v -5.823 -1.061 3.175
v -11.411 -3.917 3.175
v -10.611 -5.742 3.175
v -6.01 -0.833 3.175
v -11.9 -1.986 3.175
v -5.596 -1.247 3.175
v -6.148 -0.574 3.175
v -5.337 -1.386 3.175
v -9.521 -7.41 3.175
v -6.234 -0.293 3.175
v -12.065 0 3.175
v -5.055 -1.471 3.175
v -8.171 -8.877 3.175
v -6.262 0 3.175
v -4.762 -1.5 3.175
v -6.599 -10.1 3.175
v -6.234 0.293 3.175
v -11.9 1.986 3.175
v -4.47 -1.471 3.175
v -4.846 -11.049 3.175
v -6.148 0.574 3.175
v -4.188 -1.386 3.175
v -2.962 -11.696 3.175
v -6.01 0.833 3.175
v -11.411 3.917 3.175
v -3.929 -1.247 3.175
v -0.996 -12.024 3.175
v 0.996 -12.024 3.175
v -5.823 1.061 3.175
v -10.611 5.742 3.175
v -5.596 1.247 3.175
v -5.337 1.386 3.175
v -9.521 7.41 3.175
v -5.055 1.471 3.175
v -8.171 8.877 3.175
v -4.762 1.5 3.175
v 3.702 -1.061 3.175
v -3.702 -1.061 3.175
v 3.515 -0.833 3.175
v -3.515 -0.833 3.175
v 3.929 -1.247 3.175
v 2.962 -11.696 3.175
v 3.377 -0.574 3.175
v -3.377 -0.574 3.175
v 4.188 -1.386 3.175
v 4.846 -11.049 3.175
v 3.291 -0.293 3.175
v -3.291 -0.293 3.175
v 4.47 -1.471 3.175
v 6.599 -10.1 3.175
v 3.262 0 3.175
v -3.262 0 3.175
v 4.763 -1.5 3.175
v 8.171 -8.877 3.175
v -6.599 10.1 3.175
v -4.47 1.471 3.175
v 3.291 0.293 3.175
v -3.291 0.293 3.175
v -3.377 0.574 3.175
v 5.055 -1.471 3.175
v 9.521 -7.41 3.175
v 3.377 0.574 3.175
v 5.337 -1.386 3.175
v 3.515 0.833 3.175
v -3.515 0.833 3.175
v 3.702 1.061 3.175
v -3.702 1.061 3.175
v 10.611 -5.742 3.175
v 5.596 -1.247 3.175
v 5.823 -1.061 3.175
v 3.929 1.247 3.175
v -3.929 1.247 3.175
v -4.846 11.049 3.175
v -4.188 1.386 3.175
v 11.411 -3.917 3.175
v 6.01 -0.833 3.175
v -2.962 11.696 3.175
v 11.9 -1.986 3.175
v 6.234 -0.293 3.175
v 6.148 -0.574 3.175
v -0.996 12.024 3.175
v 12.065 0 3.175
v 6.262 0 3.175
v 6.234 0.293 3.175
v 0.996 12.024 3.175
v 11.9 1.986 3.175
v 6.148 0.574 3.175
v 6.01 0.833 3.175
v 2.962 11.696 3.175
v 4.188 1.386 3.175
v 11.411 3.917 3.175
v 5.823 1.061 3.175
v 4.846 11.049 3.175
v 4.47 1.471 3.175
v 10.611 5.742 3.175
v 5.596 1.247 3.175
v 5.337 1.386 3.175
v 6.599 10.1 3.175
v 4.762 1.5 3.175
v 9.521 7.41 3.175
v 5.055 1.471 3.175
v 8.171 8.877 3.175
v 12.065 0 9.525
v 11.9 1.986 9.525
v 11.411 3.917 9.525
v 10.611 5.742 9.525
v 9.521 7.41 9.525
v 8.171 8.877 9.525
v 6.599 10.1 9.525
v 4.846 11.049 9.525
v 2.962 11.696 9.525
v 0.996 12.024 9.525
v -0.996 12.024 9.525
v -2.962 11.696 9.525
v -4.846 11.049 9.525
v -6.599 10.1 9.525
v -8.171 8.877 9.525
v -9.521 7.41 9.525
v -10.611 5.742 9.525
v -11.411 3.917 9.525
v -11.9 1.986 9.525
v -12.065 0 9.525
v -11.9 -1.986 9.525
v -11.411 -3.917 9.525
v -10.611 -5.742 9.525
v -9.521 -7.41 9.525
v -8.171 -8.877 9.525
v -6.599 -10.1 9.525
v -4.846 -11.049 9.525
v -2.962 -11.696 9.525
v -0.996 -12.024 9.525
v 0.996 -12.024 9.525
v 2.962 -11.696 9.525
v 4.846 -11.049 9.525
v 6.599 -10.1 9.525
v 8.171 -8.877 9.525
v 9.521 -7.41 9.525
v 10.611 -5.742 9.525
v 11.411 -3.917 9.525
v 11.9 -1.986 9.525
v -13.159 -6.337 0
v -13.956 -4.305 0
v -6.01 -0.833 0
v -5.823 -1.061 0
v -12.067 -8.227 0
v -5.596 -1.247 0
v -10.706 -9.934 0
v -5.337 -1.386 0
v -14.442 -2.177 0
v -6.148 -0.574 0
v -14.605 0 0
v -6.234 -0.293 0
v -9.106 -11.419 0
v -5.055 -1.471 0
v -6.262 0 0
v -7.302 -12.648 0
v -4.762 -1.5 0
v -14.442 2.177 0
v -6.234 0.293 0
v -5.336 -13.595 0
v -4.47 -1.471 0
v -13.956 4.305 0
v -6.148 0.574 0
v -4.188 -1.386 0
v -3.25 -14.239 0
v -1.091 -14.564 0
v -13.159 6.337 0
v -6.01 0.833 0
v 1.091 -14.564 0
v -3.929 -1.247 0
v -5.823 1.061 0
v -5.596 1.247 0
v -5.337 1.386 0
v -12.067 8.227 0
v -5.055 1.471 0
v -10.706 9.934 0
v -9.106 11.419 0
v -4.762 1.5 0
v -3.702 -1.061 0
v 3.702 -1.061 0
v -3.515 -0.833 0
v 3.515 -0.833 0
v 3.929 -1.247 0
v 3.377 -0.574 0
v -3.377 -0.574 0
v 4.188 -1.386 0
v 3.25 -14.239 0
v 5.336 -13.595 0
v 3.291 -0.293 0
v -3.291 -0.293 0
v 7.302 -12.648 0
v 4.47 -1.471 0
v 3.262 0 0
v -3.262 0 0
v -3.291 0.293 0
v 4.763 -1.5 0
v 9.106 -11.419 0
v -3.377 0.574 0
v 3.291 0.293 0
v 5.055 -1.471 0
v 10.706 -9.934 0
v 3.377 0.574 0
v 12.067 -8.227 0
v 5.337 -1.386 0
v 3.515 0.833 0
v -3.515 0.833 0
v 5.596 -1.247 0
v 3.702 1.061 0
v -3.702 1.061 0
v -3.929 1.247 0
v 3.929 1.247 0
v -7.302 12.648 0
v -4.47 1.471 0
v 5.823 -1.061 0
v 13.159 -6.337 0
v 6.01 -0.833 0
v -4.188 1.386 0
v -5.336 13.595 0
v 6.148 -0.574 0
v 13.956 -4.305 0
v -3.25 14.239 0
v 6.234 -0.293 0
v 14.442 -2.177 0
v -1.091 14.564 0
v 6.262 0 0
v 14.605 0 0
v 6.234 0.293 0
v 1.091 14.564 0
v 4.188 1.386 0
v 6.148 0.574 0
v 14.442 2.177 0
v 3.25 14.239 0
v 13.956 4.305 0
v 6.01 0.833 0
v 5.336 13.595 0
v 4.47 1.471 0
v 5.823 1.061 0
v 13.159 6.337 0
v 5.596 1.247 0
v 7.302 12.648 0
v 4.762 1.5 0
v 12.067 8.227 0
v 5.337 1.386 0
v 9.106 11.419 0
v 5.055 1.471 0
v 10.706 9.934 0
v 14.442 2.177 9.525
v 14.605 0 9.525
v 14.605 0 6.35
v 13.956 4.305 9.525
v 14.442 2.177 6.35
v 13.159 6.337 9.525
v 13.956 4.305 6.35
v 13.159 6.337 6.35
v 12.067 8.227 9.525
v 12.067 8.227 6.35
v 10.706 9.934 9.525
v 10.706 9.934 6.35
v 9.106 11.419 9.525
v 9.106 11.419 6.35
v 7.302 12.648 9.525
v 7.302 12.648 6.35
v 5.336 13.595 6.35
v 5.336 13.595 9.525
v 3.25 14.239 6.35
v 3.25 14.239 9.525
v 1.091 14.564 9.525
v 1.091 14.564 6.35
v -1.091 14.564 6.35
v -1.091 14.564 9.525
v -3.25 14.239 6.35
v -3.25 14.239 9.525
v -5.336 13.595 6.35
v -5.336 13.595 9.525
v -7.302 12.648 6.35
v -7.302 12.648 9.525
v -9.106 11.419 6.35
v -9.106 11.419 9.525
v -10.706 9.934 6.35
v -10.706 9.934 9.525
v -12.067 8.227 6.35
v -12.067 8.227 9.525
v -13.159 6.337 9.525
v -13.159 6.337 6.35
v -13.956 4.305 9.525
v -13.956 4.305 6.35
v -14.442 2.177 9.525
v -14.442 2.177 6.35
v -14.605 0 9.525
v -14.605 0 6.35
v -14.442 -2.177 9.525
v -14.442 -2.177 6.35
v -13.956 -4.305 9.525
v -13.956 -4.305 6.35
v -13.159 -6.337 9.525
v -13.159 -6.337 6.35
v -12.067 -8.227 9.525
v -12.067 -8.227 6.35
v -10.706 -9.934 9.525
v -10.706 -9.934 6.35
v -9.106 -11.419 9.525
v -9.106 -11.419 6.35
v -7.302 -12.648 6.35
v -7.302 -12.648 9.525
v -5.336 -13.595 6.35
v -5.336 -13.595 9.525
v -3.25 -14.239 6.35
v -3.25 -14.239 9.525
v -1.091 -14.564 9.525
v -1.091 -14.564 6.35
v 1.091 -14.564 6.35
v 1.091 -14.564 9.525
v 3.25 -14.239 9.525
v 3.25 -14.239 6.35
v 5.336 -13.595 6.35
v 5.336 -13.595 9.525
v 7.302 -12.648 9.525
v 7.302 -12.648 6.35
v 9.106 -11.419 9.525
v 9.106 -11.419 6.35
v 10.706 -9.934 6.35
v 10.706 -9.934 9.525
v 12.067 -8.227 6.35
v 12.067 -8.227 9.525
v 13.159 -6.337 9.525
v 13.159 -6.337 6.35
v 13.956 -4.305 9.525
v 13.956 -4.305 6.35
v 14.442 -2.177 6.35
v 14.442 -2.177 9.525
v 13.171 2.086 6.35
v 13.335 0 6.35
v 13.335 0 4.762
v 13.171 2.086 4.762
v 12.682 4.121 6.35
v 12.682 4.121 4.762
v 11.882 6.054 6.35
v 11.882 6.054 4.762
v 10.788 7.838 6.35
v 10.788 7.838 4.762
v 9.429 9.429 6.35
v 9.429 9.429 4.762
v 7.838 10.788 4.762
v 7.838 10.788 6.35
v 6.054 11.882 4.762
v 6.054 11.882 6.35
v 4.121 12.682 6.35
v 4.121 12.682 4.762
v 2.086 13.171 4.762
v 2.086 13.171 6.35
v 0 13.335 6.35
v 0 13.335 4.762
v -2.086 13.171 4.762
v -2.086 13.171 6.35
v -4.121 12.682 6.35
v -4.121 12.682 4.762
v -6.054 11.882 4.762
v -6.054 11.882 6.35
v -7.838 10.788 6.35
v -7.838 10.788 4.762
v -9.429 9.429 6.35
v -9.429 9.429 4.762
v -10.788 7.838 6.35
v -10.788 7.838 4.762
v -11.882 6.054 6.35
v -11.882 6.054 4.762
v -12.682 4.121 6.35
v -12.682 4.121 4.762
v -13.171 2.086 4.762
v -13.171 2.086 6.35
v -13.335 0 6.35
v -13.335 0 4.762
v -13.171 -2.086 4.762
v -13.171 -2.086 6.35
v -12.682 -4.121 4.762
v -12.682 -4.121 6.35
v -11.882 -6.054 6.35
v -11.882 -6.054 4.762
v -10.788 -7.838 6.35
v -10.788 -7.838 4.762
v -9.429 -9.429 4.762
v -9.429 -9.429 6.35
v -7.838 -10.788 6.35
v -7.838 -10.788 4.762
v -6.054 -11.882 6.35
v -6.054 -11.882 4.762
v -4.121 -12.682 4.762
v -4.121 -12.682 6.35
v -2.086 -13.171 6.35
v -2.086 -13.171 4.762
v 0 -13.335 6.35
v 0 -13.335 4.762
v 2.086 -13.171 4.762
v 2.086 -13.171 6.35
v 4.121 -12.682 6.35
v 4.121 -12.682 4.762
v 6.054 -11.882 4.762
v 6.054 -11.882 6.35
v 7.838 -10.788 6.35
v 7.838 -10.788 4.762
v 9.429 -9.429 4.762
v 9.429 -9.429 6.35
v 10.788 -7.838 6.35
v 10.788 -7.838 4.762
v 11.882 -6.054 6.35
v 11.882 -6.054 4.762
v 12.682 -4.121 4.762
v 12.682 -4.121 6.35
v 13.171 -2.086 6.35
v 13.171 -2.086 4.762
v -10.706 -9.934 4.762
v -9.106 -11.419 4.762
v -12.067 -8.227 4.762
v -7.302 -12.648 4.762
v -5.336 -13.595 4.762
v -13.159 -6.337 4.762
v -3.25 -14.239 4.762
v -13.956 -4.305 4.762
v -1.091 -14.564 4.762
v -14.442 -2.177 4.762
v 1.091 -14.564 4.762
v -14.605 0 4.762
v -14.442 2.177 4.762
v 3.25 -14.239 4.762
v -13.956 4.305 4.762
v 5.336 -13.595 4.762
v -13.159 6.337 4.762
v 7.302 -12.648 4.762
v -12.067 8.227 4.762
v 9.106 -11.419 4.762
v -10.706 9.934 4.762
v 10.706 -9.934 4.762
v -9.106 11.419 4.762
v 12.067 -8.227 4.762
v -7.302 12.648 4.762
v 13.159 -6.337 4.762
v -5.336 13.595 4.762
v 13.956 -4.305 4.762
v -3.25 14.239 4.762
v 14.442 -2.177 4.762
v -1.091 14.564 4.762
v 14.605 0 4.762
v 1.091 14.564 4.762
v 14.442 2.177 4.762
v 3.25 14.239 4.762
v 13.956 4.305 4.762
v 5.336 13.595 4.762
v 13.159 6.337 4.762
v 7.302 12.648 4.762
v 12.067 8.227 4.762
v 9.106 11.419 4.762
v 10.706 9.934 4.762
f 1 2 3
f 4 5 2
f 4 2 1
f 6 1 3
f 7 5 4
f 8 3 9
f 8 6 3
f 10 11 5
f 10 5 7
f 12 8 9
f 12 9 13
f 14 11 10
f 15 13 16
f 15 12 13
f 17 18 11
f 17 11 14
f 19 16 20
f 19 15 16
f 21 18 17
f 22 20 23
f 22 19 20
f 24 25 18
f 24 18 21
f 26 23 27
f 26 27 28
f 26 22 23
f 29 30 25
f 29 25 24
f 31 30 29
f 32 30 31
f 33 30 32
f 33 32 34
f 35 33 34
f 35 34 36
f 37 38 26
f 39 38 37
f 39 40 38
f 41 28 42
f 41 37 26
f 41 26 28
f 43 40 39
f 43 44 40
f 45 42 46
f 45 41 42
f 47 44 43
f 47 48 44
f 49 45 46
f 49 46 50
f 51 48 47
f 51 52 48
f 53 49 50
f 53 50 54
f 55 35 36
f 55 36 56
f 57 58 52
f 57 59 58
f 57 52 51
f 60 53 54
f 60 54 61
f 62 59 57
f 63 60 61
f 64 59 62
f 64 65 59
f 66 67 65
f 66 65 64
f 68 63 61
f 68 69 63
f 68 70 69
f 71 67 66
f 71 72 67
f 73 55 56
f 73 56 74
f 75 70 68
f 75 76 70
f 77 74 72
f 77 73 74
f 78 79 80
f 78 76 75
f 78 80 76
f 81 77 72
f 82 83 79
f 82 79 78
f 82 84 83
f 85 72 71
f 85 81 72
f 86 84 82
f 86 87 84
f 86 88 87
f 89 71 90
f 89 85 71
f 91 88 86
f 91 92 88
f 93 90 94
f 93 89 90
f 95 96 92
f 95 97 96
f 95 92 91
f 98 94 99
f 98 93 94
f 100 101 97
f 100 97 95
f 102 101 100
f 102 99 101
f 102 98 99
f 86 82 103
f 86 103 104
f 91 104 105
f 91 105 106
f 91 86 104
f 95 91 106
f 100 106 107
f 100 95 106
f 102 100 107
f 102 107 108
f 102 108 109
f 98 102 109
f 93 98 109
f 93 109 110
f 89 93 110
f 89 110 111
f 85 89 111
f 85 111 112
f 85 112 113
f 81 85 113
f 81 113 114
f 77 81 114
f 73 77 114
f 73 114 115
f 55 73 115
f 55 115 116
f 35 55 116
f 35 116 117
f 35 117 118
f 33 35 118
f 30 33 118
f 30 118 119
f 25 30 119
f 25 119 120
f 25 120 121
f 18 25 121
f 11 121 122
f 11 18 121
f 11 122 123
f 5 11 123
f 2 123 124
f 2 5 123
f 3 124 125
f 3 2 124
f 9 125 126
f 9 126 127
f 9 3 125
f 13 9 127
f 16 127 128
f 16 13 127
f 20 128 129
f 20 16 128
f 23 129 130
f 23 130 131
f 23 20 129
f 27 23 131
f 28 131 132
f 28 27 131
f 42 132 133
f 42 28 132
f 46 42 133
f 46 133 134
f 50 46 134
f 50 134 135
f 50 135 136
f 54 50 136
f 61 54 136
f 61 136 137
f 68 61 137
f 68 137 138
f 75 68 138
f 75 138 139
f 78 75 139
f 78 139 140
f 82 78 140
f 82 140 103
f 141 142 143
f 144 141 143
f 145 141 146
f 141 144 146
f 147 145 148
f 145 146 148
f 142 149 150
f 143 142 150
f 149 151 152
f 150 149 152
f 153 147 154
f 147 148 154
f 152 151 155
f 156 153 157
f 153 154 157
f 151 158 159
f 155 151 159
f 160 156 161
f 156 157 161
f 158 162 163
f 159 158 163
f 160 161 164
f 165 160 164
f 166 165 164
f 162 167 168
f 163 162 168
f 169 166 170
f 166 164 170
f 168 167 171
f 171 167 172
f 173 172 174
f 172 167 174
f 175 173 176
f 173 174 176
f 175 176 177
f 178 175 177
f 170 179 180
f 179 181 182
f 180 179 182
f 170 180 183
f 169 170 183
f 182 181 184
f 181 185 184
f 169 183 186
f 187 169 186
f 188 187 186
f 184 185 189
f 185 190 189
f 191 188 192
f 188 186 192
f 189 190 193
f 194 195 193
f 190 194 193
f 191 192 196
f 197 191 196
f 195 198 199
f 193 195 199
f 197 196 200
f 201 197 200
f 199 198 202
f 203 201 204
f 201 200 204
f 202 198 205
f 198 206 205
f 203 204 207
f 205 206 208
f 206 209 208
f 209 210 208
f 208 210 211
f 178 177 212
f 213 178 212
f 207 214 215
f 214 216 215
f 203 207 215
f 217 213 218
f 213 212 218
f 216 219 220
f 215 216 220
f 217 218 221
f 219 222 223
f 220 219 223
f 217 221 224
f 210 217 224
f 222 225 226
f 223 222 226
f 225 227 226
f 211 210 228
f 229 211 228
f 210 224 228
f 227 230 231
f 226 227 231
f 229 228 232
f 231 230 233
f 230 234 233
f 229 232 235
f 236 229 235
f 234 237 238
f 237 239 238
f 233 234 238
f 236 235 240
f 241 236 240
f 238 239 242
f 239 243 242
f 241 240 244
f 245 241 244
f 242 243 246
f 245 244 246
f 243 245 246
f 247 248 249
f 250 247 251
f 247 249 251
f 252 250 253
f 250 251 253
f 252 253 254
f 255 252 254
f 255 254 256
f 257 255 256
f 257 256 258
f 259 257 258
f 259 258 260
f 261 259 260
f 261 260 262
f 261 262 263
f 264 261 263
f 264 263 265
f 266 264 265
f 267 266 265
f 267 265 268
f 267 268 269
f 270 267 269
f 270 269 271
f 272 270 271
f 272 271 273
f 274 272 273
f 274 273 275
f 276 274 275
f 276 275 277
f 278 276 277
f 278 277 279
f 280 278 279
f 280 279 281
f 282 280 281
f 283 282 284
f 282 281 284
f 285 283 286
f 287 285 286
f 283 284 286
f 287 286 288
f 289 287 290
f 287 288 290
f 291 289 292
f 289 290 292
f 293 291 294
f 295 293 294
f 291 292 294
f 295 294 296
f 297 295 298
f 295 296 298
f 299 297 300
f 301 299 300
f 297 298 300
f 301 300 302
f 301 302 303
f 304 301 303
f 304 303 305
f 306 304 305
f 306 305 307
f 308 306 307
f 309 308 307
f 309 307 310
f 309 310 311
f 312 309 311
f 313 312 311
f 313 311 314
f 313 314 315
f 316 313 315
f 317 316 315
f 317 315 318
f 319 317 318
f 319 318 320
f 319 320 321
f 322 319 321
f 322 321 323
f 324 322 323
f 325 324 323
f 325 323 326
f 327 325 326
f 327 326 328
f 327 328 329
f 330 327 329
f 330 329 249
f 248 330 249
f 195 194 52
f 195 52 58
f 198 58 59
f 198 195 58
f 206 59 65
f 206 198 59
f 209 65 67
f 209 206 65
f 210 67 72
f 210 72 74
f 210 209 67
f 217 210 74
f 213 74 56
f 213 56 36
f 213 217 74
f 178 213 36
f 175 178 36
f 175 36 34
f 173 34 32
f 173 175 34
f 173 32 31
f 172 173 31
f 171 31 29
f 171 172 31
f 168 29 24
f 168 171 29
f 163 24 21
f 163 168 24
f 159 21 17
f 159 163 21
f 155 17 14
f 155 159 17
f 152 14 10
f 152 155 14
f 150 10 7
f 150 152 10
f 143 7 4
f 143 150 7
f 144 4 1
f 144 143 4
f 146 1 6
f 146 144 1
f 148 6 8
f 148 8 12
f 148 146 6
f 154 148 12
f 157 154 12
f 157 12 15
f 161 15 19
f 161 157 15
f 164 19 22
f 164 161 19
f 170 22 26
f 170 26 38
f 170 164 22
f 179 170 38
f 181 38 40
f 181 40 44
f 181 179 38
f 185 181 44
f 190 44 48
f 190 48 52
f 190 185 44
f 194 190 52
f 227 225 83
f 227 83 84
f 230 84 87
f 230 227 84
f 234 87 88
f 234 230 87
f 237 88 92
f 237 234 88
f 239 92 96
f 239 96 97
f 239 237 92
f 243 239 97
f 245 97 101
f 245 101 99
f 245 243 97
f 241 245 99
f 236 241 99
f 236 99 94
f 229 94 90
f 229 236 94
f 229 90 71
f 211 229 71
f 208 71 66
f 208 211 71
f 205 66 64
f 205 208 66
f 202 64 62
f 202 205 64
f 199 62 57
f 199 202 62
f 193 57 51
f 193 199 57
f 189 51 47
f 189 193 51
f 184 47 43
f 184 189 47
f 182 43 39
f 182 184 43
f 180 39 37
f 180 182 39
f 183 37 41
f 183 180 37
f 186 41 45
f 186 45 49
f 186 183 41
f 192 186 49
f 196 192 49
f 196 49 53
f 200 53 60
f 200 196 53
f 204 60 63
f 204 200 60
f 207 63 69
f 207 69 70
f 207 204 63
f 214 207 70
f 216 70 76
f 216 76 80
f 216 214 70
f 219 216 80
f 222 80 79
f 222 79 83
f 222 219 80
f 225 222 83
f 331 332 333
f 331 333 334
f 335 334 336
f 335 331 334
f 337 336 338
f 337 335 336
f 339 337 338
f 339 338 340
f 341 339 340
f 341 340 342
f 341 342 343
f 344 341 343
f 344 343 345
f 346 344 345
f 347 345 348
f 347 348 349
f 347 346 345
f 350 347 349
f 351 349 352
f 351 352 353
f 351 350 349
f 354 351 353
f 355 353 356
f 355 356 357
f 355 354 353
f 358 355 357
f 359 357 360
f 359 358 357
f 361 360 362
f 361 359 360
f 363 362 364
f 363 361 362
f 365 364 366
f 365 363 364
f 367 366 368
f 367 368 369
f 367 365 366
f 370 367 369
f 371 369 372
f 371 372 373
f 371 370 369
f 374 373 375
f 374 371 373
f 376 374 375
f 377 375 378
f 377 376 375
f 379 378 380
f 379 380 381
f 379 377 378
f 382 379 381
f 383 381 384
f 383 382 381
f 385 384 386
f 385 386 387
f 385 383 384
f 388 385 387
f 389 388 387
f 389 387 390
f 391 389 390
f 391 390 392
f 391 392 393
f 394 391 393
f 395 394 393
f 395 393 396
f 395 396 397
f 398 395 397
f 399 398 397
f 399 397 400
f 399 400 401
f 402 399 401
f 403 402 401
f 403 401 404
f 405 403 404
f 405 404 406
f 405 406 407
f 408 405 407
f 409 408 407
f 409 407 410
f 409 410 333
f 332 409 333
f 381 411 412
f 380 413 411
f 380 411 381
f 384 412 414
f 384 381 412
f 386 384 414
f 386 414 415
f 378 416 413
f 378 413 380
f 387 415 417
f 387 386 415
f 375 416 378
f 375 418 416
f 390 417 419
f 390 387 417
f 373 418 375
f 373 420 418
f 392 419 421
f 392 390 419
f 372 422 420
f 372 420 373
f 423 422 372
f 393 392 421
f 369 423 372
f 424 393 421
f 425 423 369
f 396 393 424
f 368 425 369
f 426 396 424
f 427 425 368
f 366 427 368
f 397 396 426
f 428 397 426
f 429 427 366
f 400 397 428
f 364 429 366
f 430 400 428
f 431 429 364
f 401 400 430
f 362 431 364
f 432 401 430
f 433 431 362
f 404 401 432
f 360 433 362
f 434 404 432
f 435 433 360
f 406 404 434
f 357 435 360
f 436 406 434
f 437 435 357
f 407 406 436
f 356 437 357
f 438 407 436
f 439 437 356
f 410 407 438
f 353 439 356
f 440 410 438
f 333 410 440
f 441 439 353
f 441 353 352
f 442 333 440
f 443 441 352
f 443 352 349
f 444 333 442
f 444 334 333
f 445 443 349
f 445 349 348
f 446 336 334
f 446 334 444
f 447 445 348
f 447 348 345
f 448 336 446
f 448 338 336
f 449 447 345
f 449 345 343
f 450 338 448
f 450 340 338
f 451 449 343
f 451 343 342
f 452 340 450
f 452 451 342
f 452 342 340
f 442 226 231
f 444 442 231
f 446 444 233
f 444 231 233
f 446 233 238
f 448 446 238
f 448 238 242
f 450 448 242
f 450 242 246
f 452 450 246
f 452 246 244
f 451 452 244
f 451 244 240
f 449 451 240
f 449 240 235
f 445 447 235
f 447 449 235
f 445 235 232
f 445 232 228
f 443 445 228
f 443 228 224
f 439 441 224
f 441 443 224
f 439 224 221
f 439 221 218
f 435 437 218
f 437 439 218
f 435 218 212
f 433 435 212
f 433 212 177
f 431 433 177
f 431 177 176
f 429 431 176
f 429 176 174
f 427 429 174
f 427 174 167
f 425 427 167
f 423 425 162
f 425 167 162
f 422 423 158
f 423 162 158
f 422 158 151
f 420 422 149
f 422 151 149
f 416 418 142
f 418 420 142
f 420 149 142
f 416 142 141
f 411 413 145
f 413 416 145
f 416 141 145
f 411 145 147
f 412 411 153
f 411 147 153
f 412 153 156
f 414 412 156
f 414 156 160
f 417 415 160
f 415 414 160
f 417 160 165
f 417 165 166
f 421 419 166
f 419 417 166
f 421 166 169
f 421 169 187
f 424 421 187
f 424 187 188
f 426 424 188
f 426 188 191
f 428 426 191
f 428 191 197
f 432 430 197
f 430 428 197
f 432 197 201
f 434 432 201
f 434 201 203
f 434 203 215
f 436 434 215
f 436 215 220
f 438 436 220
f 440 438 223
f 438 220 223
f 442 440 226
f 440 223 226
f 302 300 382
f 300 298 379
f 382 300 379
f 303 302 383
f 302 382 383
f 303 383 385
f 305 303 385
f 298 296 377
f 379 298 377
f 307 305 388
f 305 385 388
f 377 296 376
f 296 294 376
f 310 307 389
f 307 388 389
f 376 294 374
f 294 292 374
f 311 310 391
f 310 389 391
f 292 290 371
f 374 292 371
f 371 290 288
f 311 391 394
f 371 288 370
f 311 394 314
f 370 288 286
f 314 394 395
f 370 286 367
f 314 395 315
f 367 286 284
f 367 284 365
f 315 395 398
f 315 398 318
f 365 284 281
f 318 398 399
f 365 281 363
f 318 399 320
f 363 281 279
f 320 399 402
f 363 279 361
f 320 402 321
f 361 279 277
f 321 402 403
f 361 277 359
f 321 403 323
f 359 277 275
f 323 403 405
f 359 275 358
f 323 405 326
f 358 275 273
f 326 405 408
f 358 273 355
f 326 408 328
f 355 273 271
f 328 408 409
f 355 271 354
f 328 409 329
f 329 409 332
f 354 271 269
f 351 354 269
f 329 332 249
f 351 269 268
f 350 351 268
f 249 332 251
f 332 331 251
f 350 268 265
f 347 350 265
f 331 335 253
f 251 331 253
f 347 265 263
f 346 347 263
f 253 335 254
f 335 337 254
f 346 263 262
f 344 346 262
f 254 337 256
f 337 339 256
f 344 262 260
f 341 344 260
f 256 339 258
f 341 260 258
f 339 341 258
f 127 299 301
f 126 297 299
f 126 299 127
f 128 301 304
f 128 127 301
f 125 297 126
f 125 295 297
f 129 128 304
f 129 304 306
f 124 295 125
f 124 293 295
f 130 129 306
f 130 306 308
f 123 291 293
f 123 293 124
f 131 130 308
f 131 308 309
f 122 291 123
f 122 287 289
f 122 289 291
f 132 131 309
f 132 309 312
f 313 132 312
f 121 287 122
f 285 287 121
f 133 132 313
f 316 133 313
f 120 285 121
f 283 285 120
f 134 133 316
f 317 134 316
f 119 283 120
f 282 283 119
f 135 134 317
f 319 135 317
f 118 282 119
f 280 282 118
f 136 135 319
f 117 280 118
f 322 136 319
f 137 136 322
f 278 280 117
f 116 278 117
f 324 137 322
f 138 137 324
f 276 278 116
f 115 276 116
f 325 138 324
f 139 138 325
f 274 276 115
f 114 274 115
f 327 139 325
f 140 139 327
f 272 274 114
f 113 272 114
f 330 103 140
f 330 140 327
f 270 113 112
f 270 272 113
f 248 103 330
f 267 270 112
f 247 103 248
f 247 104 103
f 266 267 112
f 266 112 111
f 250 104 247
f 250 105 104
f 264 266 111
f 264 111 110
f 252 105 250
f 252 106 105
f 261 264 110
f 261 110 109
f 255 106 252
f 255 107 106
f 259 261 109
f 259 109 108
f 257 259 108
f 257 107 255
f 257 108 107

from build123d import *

# Parameters (mm, degrees)
F0_R     = 14.605
F0_R_2   = 12.065
F1_DEPTH = 9.525
F0_R_3   = 1.5
F2_DEPTH = 3.175
F4_R     = 18.379294
F4_R_2   = 13.335
F5_DEPTH = 1.5875


with BuildPart() as f1:
    # F0 (on Top) → F1 (new body)
    with BuildSketch(Plane.XY):
        Circle(F0_R)
        Circle(F0_R_2, mode=Mode.SUBTRACT)
    extrude(amount=F1_DEPTH)

    # F0 (on Top) → F2 (join)
    with BuildSketch(Plane.XY):
        Circle(F0_R_2)
        with Locations((-4.7625, 0)):
            Circle(F0_R_3, mode=Mode.SUBTRACT)
        with Locations((4.7625, 0)):
            Circle(F0_R_3, mode=Mode.SUBTRACT)
    extrude(amount=F2_DEPTH)

    # F4 (on offset) → F5 (cut)
    with BuildSketch(Plane.XY.offset(6.35)):
        Circle(F4_R)
        Circle(F4_R_2, mode=Mode.SUBTRACT)
    extrude(amount=-F5_DEPTH, mode=Mode.SUBTRACT)


solid = f1.part
